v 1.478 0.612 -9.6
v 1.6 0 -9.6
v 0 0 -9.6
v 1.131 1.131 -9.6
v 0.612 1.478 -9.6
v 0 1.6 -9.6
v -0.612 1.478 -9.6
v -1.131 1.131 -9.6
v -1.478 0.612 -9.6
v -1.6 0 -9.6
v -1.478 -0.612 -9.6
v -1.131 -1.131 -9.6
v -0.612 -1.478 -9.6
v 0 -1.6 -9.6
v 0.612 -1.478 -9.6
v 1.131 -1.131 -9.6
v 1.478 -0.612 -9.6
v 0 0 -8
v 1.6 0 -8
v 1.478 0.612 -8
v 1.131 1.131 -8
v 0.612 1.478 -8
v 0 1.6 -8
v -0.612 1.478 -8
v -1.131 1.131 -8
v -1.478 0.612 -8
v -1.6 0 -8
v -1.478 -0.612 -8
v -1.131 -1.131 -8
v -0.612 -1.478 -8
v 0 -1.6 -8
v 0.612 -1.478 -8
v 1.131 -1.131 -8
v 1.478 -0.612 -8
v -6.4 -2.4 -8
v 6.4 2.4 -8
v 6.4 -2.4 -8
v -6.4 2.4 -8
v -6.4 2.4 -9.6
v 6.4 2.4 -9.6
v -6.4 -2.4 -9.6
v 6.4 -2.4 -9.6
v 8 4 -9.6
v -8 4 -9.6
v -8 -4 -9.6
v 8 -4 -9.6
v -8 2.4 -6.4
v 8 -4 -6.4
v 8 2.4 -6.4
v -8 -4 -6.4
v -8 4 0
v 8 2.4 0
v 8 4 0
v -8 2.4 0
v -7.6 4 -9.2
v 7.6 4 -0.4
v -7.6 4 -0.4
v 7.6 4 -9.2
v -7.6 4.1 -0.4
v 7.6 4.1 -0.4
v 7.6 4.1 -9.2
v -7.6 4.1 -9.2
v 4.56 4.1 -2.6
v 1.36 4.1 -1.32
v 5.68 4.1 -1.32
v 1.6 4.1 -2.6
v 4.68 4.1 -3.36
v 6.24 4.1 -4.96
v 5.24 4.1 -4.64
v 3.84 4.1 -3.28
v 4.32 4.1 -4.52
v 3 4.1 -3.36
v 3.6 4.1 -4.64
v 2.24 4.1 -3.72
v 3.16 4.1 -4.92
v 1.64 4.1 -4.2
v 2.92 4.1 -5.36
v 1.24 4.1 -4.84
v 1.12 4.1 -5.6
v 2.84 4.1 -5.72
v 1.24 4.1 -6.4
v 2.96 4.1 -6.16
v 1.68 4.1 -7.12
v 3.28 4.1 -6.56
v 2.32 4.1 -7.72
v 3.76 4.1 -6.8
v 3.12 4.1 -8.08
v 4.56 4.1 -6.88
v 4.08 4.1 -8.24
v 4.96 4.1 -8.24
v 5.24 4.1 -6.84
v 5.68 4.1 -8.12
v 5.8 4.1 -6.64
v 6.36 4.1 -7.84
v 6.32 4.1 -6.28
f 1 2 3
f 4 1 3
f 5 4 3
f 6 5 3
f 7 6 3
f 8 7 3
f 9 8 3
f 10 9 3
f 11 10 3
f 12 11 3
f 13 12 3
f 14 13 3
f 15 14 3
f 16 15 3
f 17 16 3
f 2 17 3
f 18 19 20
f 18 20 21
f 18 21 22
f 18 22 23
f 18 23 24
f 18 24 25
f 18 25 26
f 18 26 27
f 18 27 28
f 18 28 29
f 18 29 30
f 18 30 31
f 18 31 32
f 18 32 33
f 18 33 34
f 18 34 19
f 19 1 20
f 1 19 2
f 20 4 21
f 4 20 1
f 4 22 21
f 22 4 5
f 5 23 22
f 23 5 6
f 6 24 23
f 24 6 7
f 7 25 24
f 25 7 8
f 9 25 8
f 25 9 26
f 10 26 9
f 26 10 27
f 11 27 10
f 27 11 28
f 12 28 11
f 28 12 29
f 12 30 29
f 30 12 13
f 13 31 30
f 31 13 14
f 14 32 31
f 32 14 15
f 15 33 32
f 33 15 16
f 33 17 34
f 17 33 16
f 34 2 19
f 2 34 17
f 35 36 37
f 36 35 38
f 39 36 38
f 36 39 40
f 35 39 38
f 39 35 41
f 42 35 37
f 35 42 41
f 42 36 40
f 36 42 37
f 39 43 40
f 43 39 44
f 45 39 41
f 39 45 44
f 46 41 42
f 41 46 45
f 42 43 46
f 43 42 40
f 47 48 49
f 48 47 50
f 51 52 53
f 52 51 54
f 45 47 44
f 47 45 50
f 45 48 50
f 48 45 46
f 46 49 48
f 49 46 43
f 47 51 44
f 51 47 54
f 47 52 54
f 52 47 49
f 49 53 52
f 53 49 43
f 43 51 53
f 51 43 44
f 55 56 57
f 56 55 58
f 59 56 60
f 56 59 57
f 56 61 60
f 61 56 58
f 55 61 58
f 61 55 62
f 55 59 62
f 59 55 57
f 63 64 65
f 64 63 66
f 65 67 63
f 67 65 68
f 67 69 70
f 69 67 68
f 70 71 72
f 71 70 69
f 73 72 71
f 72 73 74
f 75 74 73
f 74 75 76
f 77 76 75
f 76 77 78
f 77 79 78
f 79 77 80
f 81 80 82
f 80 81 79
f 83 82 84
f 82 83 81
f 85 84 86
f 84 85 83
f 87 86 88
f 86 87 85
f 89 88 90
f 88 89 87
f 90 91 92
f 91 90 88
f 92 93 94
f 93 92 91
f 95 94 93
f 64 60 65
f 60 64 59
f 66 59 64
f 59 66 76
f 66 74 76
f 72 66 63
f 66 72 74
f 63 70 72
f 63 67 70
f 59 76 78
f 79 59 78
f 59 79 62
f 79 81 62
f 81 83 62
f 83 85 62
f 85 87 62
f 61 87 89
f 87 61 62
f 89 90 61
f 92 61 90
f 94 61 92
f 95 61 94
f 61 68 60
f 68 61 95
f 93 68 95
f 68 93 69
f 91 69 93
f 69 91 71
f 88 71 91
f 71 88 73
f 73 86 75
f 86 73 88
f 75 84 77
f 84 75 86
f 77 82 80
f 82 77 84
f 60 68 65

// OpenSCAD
// file: ../p/4-4edge.scad
use <../lib.scad>
function ldraw_lib__4_4edge() = [
// 0 Circle 1.0
// 0 Name: 4-4edge.dat
// 0 Author: James Jessiman
// 0 !LDRAW_ORG Primitive UPDATE 2017-01
// 0 !LICENSE Licensed under CC BY 2.0 and CC BY 4.0 : see CAreadme.txt
// 
// 0 BFC CERTIFY CCW
  [0,"BFC","CERTIFY"],
  [0,"BFC","CCW"],
// 
// 0 !HISTORY 1998-12-15 [PTadmin] Official Update 1998-10
// 0 !HISTORY 2005-12-28 [PTadmin] Official Update 2005-01
// 0 !HISTORY 2007-06-24 [PTadmin] Header formatted for Contributor Agreement
// 0 !HISTORY 2008-07-01 [PTadmin] Official Update 2008-01
// 0 !HISTORY 2017-01-15 [Steffen] BFCed
// 0 !HISTORY 2017-12-30 [PTadmin] Official Update 2017-01
// 
// 
// 2 24 1 0 0 0.9239 0 0.3827
  [2,24,1,0,0,0.9239,0,0.3827],
// 2 24 0.9239 0 0.3827 0.7071 0 0.7071
  [2,24,0.9239,0,0.3827,0.7071,0,0.7071],
// 2 24 0.7071 0 0.7071 0.3827 0 0.9239
  [2,24,0.7071,0,0.7071,0.3827,0,0.9239],
// 2 24 0.3827 0 0.9239 0 0 1
  [2,24,0.3827,0,0.9239,0,0,1],
// 2 24 0 0 1 -0.3827 0 0.9239
  [2,24,0,0,1,-0.3827,0,0.9239],
// 2 24 -0.3827 0 0.9239 -0.7071 0 0.7071
  [2,24,-0.3827,0,0.9239,-0.7071,0,0.7071],
// 2 24 -0.7071 0 0.7071 -0.9239 0 0.3827
  [2,24,-0.7071,0,0.7071,-0.9239,0,0.3827],
// 2 24 -0.9239 0 0.3827 -1 0 -0
  [2,24,-0.9239,0,0.3827,-1,0,-0],
// 2 24 -1 0 -0 -0.9239 0 -0.3827
  [2,24,-1,0,-0,-0.9239,0,-0.3827],
// 2 24 -0.9239 0 -0.3827 -0.7071 0 -0.7071
  [2,24,-0.9239,0,-0.3827,-0.7071,0,-0.7071],
// 2 24 -0.7071 0 -0.7071 -0.3827 0 -0.9239
  [2,24,-0.7071,0,-0.7071,-0.3827,0,-0.9239],
// 2 24 -0.3827 0 -0.9239 0 0 -1
  [2,24,-0.3827,0,-0.9239,0,0,-1],
// 2 24 0 0 -1 0.3827 0 -0.9239
  [2,24,0,0,-1,0.3827,0,-0.9239],
// 2 24 0.3827 0 -0.9239 0.7071 0 -0.7071
  [2,24,0.3827,0,-0.9239,0.7071,0,-0.7071],
// 2 24 0.7071 0 -0.7071 0.9239 0 -0.3827
  [2,24,0.7071,0,-0.7071,0.9239,0,-0.3827],
// 2 24 0.9239 0 -0.3827 1 0 0
  [2,24,0.9239,0,-0.3827,1,0,0],
];
module ldraw_lib__4_4edge(step=0, col=false, unit=2/5, alt=false, line=0.2, solid=!$preview)
    makepoly(ldraw_lib__4_4edge(), step=step, col=col, unit=unit, alt=alt, line=line, solid=solid);
ldraw_lib__4_4edge(line=0.2);
// file: ../p/4-4disc.scad
use <../lib.scad>
function ldraw_lib__4_4disc() = [
// 0 Disc 1.0
// 0 Name: 4-4disc.dat
// 0 Author: James Jessiman
// 0 !LDRAW_ORG Primitive UPDATE 2002-02
// 0 !LICENSE Licensed under CC BY 2.0 and CC BY 4.0 : see CAreadme.txt
// 
// 0 BFC CERTIFY CCW
  [0,"BFC","CERTIFY"],
  [0,"BFC","CCW"],
// 
// 0 !HISTORY 1998-12-15 [PTadmin] Official Update 1998-10
// 0 !HISTORY 2002-03-23 [sbliss] Added BFC statement
// 0 !HISTORY 2002-04-25 [PTadmin] Official Update 2002-02
// 0 !HISTORY 2007-06-24 [PTadmin] Header formatted for Contributor Agreement
// 0 !HISTORY 2008-07-01 [PTadmin] Official Update 2008-01
// 
// 
// 3 16 0 0 0 1 0 0 0.9239 0 0.3827
  [3,16,0,0,0,1,0,0,0.9239,0,0.3827],
// 3 16 0 0 0 0.9239 0 0.3827 0.7071 0 0.7071
  [3,16,0,0,0,0.9239,0,0.3827,0.7071,0,0.7071],
// 3 16 0 0 0 0.7071 0 0.7071 0.3827 0 0.9239
  [3,16,0,0,0,0.7071,0,0.7071,0.3827,0,0.9239],
// 3 16 0 0 0 0.3827 0 0.9239 0 0 1
  [3,16,0,0,0,0.3827,0,0.9239,0,0,1],
// 3 16 0 0 0 0 0 1 -0.3827 0 0.9239
  [3,16,0,0,0,0,0,1,-0.3827,0,0.9239],
// 3 16 0 0 0 -0.3827 0 0.9239 -0.7071 0 0.7071
  [3,16,0,0,0,-0.3827,0,0.9239,-0.7071,0,0.7071],
// 3 16 0 0 0 -0.7071 0 0.7071 -0.9239 0 0.3827
  [3,16,0,0,0,-0.7071,0,0.7071,-0.9239,0,0.3827],
// 3 16 0 0 0 -0.9239 0 0.3827 -1 0 -0
  [3,16,0,0,0,-0.9239,0,0.3827,-1,0,-0],
// 3 16 0 0 0 -1 0 -0 -0.9239 0 -0.3827
  [3,16,0,0,0,-1,0,-0,-0.9239,0,-0.3827],
// 3 16 0 0 0 -0.9239 0 -0.3827 -0.7071 0 -0.7071
  [3,16,0,0,0,-0.9239,0,-0.3827,-0.7071,0,-0.7071],
// 3 16 0 0 0 -0.7071 0 -0.7071 -0.3827 0 -0.9239
  [3,16,0,0,0,-0.7071,0,-0.7071,-0.3827,0,-0.9239],
// 3 16 0 0 0 -0.3827 0 -0.9239 0 0 -1
  [3,16,0,0,0,-0.3827,0,-0.9239,0,0,-1],
// 3 16 0 0 0 0 0 -1 0.3827 0 -0.9239
  [3,16,0,0,0,0,0,-1,0.3827,0,-0.9239],
// 3 16 0 0 0 0.3827 0 -0.9239 0.7071 0 -0.7071
  [3,16,0,0,0,0.3827,0,-0.9239,0.7071,0,-0.7071],
// 3 16 0 0 0 0.7071 0 -0.7071 0.9239 0 -0.3827
  [3,16,0,0,0,0.7071,0,-0.7071,0.9239,0,-0.3827],
// 3 16 0 0 0 0.9239 0 -0.3827 1 0 0
  [3,16,0,0,0,0.9239,0,-0.3827,1,0,0],
// 0
];
module ldraw_lib__4_4disc(step=0, col=false, unit=2/5, alt=false, line=0.2, solid=!$preview)
    makepoly(ldraw_lib__4_4disc(), step=step, col=col, unit=unit, alt=alt, line=line, solid=solid);
ldraw_lib__4_4disc(line=0.2);
// file: ../p/4-4cyli.scad
use <../lib.scad>
$fa=1; $fs=0.2;
function ldraw_lib__4_4cyli(realsolid=false) = [
// 0 Cylinder 1.0
// 0 Name: 4-4cyli.dat
// 0 Author: James Jessiman
// 0 !LDRAW_ORG Primitive UPDATE 2005-01
// 0 !LICENSE Licensed under CC BY 2.0 and CC BY 4.0 : see CAreadme.txt
// 
// 0 BFC CERTIFY CCW
  [0,"BFC","CERTIFY"],
  [0,"BFC","CCW"],
// 
// 0 !HISTORY 1998-12-15 [PTadmin] Official Update 1998-10
// 0 !HISTORY 2002-03-23 [sbliss] Added BFC statement; merged headers from files in distributions LDraw 0.27 and Complete.
// 0 !HISTORY 2002-04-25 [PTadmin] Official Update 2002-02
// 0 !HISTORY 2004-12-14 [guyvivan] BFC CCW
// 0 !HISTORY 2005-12-28 [PTadmin] Official Update 2005-01
// 0 !HISTORY 2007-06-24 [PTadmin] Header formatted for Contributor Agreement
// 0 !HISTORY 2008-07-01 [PTadmin] Official Update 2008-01
// 
// 
// 4 16 1 1 0 0.9239 1 0.3827 0.9239 0 0.3827 1 0 0
  [4,16,1,1,0,0.9239,1,0.3827,0.9239,0,0.3827,1,0,0],
// 5 24 1 0 0 1 1 0 0.9239 0 0.3827 0.9239 0 -0.3827
  [5,24,1,0,0,1,1,0,0.9239,0,0.3827,0.9239,0,-0.3827],
// 4 16 0.9239 1 0.3827 0.7071 1 0.7071 0.7071 0 0.7071 0.9239 0 0.3827
  [4,16,0.9239,1,0.3827,0.7071,1,0.7071,0.7071,0,0.7071,0.9239,0,0.3827],
// 5 24 0.9239 0 0.3827 0.9239 1 0.3827 0.7071 0 0.7071 1 0 0
  [5,24,0.9239,0,0.3827,0.9239,1,0.3827,0.7071,0,0.7071,1,0,0],
// 4 16 0.7071 1 0.7071 0.3827 1 0.9239 0.3827 0 0.9239 0.7071 0 0.7071
  [4,16,0.7071,1,0.7071,0.3827,1,0.9239,0.3827,0,0.9239,0.7071,0,0.7071],
// 5 24 0.7071 0 0.7071 0.7071 1 0.7071 0.3827 0 0.9239 0.9239 0 0.3827
  [5,24,0.7071,0,0.7071,0.7071,1,0.7071,0.3827,0,0.9239,0.9239,0,0.3827],
// 4 16 0.3827 1 0.9239 0 1 1 0 0 1 0.3827 0 0.9239
  [4,16,0.3827,1,0.9239,0,1,1,0,0,1,0.3827,0,0.9239],
// 5 24 0.3827 0 0.9239 0.3827 1 0.9239 0 0 1 0.7071 0 0.7071
  [5,24,0.3827,0,0.9239,0.3827,1,0.9239,0,0,1,0.7071,0,0.7071],
// 4 16 0 1 1 -0.3827 1 0.9239 -0.3827 0 0.9239 0 0 1
  [4,16,0,1,1,-0.3827,1,0.9239,-0.3827,0,0.9239,0,0,1],
// 5 24 0 0 1 0 1 1 -0.3827 0 0.9239 0.3827 0 0.9239
  [5,24,0,0,1,0,1,1,-0.3827,0,0.9239,0.3827,0,0.9239],
// 4 16 -0.3827 1 0.9239 -0.7071 1 0.7071 -0.7071 0 0.7071 -0.3827 0 0.9239
  [4,16,-0.3827,1,0.9239,-0.7071,1,0.7071,-0.7071,0,0.7071,-0.3827,0,0.9239],
// 5 24 -0.3827 0 0.9239 -0.3827 1 0.9239 -0.7071 0 0.7071 0 0 1
  [5,24,-0.3827,0,0.9239,-0.3827,1,0.9239,-0.7071,0,0.7071,0,0,1],
// 4 16 -0.7071 1 0.7071 -0.9239 1 0.3827 -0.9239 0 0.3827 -0.7071 0 0.7071
  [4,16,-0.7071,1,0.7071,-0.9239,1,0.3827,-0.9239,0,0.3827,-0.7071,0,0.7071],
// 5 24 -0.7071 0 0.7071 -0.7071 1 0.7071 -0.9239 0 0.3827 -0.3827 0 0.9239
  [5,24,-0.7071,0,0.7071,-0.7071,1,0.7071,-0.9239,0,0.3827,-0.3827,0,0.9239],
// 4 16 -0.9239 1 0.3827 -1 1 0 -1 0 0 -0.9239 0 0.3827
  [4,16,-0.9239,1,0.3827,-1,1,0,-1,0,0,-0.9239,0,0.3827],
// 5 24 -0.9239 0 0.3827 -0.9239 1 0.3827 -1 0 0 -0.7071 0 0.7071
  [5,24,-0.9239,0,0.3827,-0.9239,1,0.3827,-1,0,0,-0.7071,0,0.7071],
// 4 16 -1 1 0 -0.9239 1 -0.3827 -0.9239 0 -0.3827 -1 0 0
  [4,16,-1,1,0,-0.9239,1,-0.3827,-0.9239,0,-0.3827,-1,0,0],
// 5 24 -1 0 0 -1 1 0 -0.9239 0 -0.3827 -0.9239 0 0.3827
  [5,24,-1,0,0,-1,1,0,-0.9239,0,-0.3827,-0.9239,0,0.3827],
// 4 16 -0.9239 1 -0.3827 -0.7071 1 -0.7071 -0.7071 0 -0.7071 -0.9239 0 -0.3827
  [4,16,-0.9239,1,-0.3827,-0.7071,1,-0.7071,-0.7071,0,-0.7071,-0.9239,0,-0.3827],
// 5 24 -0.9239 0 -0.3827 -0.9239 1 -0.3827 -0.7071 0 -0.7071 -1 0 0
  [5,24,-0.9239,0,-0.3827,-0.9239,1,-0.3827,-0.7071,0,-0.7071,-1,0,0],
// 4 16 -0.7071 1 -0.7071 -0.3827 1 -0.9239 -0.3827 0 -0.9239 -0.7071 0 -0.7071
  [4,16,-0.7071,1,-0.7071,-0.3827,1,-0.9239,-0.3827,0,-0.9239,-0.7071,0,-0.7071],
// 5 24 -0.7071 0 -0.7071 -0.7071 1 -0.7071 -0.3827 0 -0.9239 -0.9239 0 -0.3827
  [5,24,-0.7071,0,-0.7071,-0.7071,1,-0.7071,-0.3827,0,-0.9239,-0.9239,0,-0.3827],
// 4 16 -0.3827 1 -0.9239 0 1 -1 0 0 -1 -0.3827 0 -0.9239
  [4,16,-0.3827,1,-0.9239,0,1,-1,0,0,-1,-0.3827,0,-0.9239],
// 5 24 -0.3827 0 -0.9239 -0.3827 1 -0.9239 0 0 -1 -0.7071 0 -0.7071
  [5,24,-0.3827,0,-0.9239,-0.3827,1,-0.9239,0,0,-1,-0.7071,0,-0.7071],
// 4 16 0 1 -1 0.3827 1 -0.9239 0.3827 0 -0.9239 0 0 -1
  [4,16,0,1,-1,0.3827,1,-0.9239,0.3827,0,-0.9239,0,0,-1],
// 5 24 0 0 -1 0 1 -1 0.3827 0 -0.9239 -0.3827 0 -0.9239
  [5,24,0,0,-1,0,1,-1,0.3827,0,-0.9239,-0.3827,0,-0.9239],
// 4 16 0.3827 1 -0.9239 0.7071 1 -0.7071 0.7071 0 -0.7071 0.3827 0 -0.9239
  [4,16,0.3827,1,-0.9239,0.7071,1,-0.7071,0.7071,0,-0.7071,0.3827,0,-0.9239],
// 5 24 0.3827 0 -0.9239 0.3827 1 -0.9239 0.7071 0 -0.7071 0 0 -1
  [5,24,0.3827,0,-0.9239,0.3827,1,-0.9239,0.7071,0,-0.7071,0,0,-1],
// 4 16 0.7071 1 -0.7071 0.9239 1 -0.3827 0.9239 0 -0.3827 0.7071 0 -0.7071
  [4,16,0.7071,1,-0.7071,0.9239,1,-0.3827,0.9239,0,-0.3827,0.7071,0,-0.7071],
// 5 24 0.7071 0 -0.7071 0.7071 1 -0.7071 0.9239 0 -0.3827 0.3827 0 -0.9239
  [5,24,0.7071,0,-0.7071,0.7071,1,-0.7071,0.9239,0,-0.3827,0.3827,0,-0.9239],
// 4 16 0.9239 1 -0.3827 1 1 0 1 0 0 0.9239 0 -0.3827
  [4,16,0.9239,1,-0.3827,1,1,0,1,0,0,0.9239,0,-0.3827],
// 5 24 0.9239 0 -0.3827 0.9239 1 -0.3827 1 0 0 0.7071 0 -0.7071
  [5,24,0.9239,0,-0.3827,0.9239,1,-0.3827,1,0,0,0.7071,0,-0.7071],
// 0
];
module ldraw_lib__4_4cyli(step=0, col=false, unit=2/5, alt=false, line=0.2, solid=!$preview)
    makepoly(ldraw_lib__4_4cyli(solid), step=step, col=col, unit=unit, alt=alt, line=line, solid=solid);
ldraw_lib__4_4cyli(line=0.2);
// file: ../p/stud3.scad
use <../lib.scad>
use <4-4cyli.scad>
use <4-4disc.scad>
use <4-4edge.scad>
function ldraw_lib__stud3() = [
// 0 Stud Tube Solid
// 0 Name: stud3.dat
// 0 Author: James Jessiman
// 0 !LDRAW_ORG Primitive UPDATE 2012-01
// 0 !LICENSE Licensed under CC BY 4.0 : see CAreadme.txt
// 
// 0 BFC CERTIFY CCW
  [0,"BFC","CERTIFY"],
  [0,"BFC","CCW"],
// 
// 0 !HISTORY 2002-04-04 [sbliss] Modified for BFC compliance
// 0 !HISTORY 2002-04-25 [PTadmin] Official Update 2002-02
// 0 !HISTORY 2007-06-24 [PTadmin] Header formatted for Contributor Agreement
// 0 !HISTORY 2008-07-01 [PTadmin] Official Update 2008-01
// 0 !HISTORY 2012-02-16 [Philo] Changed to CCW
// 0 !HISTORY 2012-03-30 [PTadmin] Official Update 2012-01
// 
// 
// 1 16 0 -4 0 4 0 0 0 1 0 0 0 4 4-4edge.dat
  [1,16,0,-4,0,4,0,0,0,1,0,0,0,4, ldraw_lib__4_4edge()],
// 1 16 0 0 0 4 0 0 0 1 0 0 0 4 4-4edge.dat
  [1,16,0,0,0,4,0,0,0,1,0,0,0,4, ldraw_lib__4_4edge()],
// 1 16 0 -4 0 4 0 0 0 1 0 0 0 4 4-4disc.dat
  [1,16,0,-4,0,4,0,0,0,1,0,0,0,4, ldraw_lib__4_4disc()],
  [-1,16,0,0,0,4,0,0,0,-1,0,0,0,4, ldraw_lib__4_4disc()],
// 1 16 0 -4 0 4 0 0 0 4 0 0 0 4 4-4cyli.dat
  [1,16,0,-4,0,4,0,0,0,4,0,0,0,4, ldraw_lib__4_4cyli()],
];
module ldraw_lib__stud3(step=0, col=false, unit=2/5, alt=false, line=0.2, solid=!$preview)
    makepoly(ldraw_lib__stud3(), step=step, col=col, unit=unit, alt=alt, line=line, solid=solid);
ldraw_lib__stud3(line=0.2);
// file: ../p/box5.scad
use <../lib.scad>
function ldraw_lib__box5() = [
// 0 Box with 5 Faces and All Edges
// 0 Name: box5.dat
// 0 Author: James Jessiman
// 0 !LDRAW_ORG Primitive UPDATE 2012-01
// 0 !LICENSE Licensed under CC BY 2.0 and CC BY 4.0 : see CAreadme.txt
// 
// 0 BFC CERTIFY CCW
  [0,"BFC","CERTIFY"],
  [0,"BFC","CCW"],
// 
// 0 !HISTORY 2002-04-03 [sbliss] Modified for BFC compliance
// 0 !HISTORY 2002-04-25 [PTadmin] Official Update 2002-02
// 0 !HISTORY 2007-06-24 [PTadmin] Header formatted for Contributor Agreement
// 0 !HISTORY 2008-07-01 [PTadmin] Official Update 2008-01
// 0 !HISTORY 2012-02-16 [Philo] Changed to CCW
// 0 !HISTORY 2012-03-30 [PTadmin] Official Update 2012-01
// 
// 
// 2 24 1 1 1 -1 1 1
  [2,24,1,1,1,-1,1,1],
// 2 24 -1 1 1 -1 1 -1
  [2,24,-1,1,1,-1,1,-1],
// 2 24 -1 1 -1 1 1 -1
  [2,24,-1,1,-1,1,1,-1],
// 2 24 1 1 -1 1 1 1
  [2,24,1,1,-1,1,1,1],
// 2 24 1 0 1 -1 0 1
  [2,24,1,0,1,-1,0,1],
// 2 24 -1 0 1 -1 0 -1
  [2,24,-1,0,1,-1,0,-1],
// 2 24 -1 0 -1 1 0 -1
  [2,24,-1,0,-1,1,0,-1],
// 2 24 1 0 -1 1 0 1
  [2,24,1,0,-1,1,0,1],
// 2 24 1 0 1 1 1 1
  [2,24,1,0,1,1,1,1],
// 2 24 -1 0 1 -1 1 1
  [2,24,-1,0,1,-1,1,1],
// 2 24 1 0 -1 1 1 -1
  [2,24,1,0,-1,1,1,-1],
// 2 24 -1 0 -1 -1 1 -1
  [2,24,-1,0,-1,-1,1,-1],
// 4 16 -1 1 1 1 1 1 1 1 -1 -1 1 -1
  [4,16,-1,1,1,1,1,1,1,1,-1,-1,1,-1],
// 4 16 -1 1 1 -1 0 1 1 0 1 1 1 1
  [4,16,-1,1,1,-1,0,1,1,0,1,1,1,1],
// 4 16 -1 1 -1 -1 0 -1 -1 0 1 -1 1 1
  [4,16,-1,1,-1,-1,0,-1,-1,0,1,-1,1,1],
// 4 16 1 1 -1 1 0 -1 -1 0 -1 -1 1 -1
  [4,16,1,1,-1,1,0,-1,-1,0,-1,-1,1,-1],
// 4 16 1 1 1 1 0 1 1 0 -1 1 1 -1
  [4,16,1,1,1,1,0,1,1,0,-1,1,1,-1],
];
makepoly(ldraw_lib__box5(), line=0.2);
// file: s/4865as01.scad
use <../../lib.scad>
use <../../p/box5.scad>
use <../../p/stud3.scad>
function ldraw_lib__s__4865as01() = [
// 0 ~Panel  1 x  2 x  1 without Front Face
// 0 Name: s\4865as01.dat
// 0 Author: James Jessiman
// 0 !LDRAW_ORG Subpart UPDATE 2020-03
// 0 !LICENSE Licensed under CC BY 2.0 and CC BY 4.0 : see CAreadme.txt
// 
// 0 BFC CERTIFY CCW
  [0,"BFC","CERTIFY"],
  [0,"BFC","CCW"],
// 
// 0 !HISTORY 2003-07-03 [Steffen] BFCed, subfiled
// 0 !HISTORY 2004-04-22 [PTadmin] Official Update 2004-02
// 0 !HISTORY 2007-09-10 [PTadmin] Header formatted for Contributor Agreement
// 0 !HISTORY 2008-07-01 [PTadmin] Official Update 2008-01
// 0 !HISTORY 2020-07-14 [PTadmin] Renamed from s/4865s01
// 0 !HISTORY 2020-12-29 [PTadmin] Official Update 2020-03
// 
// 
// 1 16 0 20 0 1 0 0 0 -1 0 0 0 1 stud3.dat
  [1,16,0,20,0,1,0,0,0,-1,0,0,0,1, ldraw_lib__stud3()],
// 0 BFC INVERTNEXT
  [0,"BFC","INVERTNEXT"],
// 1 16 0 24 0 16 0 0 0 -4 0 0 0 6 box5.dat
  [1,16,0,24,0,16,0,0,0,-4,0,0,0,6, ldraw_lib__box5()],
// 4 16 20 24 10 16 24 6 -16 24 6 -20 24 10
  [4,16,20,24,10,16,24,6,-16,24,6,-20,24,10],
// 4 16 -20 24 10 -16 24 6 -16 24 -6 -20 24 -10
  [4,16,-20,24,10,-16,24,6,-16,24,-6,-20,24,-10],
// 4 16 -20 24 -10 -16 24 -6 16 24 -6 20 24 -10
  [4,16,-20,24,-10,-16,24,-6,16,24,-6,20,24,-10],
// 4 16 20 24 -10 16 24 -6 16 24 6 20 24 10
  [4,16,20,24,-10,16,24,-6,16,24,6,20,24,10],
// 2 24 20 24 10 -20 24 10
  [2,24,20,24,10,-20,24,10],
// 2 24 -20 24 10 -20 24 -10
  [2,24,-20,24,10,-20,24,-10],
// 2 24 -20 24 -10 20 24 -10
  [2,24,-20,24,-10,20,24,-10],
// 2 24 20 24 -10 20 24 10
  [2,24,20,24,-10,20,24,10],
// 2 24 20 16 6 -20 16 6
  [2,24,20,16,6,-20,16,6],
// 2 24 -20 16 6 -20 16 -10
  [2,24,-20,16,6,-20,16,-10],
// 2 24 -20 16 -10 20 16 -10
  [2,24,-20,16,-10,20,16,-10],
// 2 24 20 16 -10 20 16 6
  [2,24,20,16,-10,20,16,6],
// 2 24 20 0 10 -20 0 10
  [2,24,20,0,10,-20,0,10],
// 2 24 -20 0 10 -20 0 6
  [2,24,-20,0,10,-20,0,6],
// 2 24 -20 0 6 20 0 6
  [2,24,-20,0,6,20,0,6],
// 2 24 20 0 6 20 0 10
  [2,24,20,0,6,20,0,10],
// 2 24 20 0 6 20 16 6
  [2,24,20,0,6,20,16,6],
// 2 24 -20 0 6 -20 16 6
  [2,24,-20,0,6,-20,16,6],
// 2 24 20 16 -10 20 24 -10
  [2,24,20,16,-10,20,24,-10],
// 2 24 -20 16 -10 -20 24 -10
  [2,24,-20,16,-10,-20,24,-10],
// 2 24 20 0 10 20 24 10
  [2,24,20,0,10,20,24,10],
// 2 24 -20 0 10 -20 24 10
  [2,24,-20,0,10,-20,24,10],
// 4 16 20 16 -10 20 16 6 -20 16 6 -20 16 -10
  [4,16,20,16,-10,20,16,6,-20,16,6,-20,16,-10],
// 4 16 20 0 6 20 0 10 -20 0 10 -20 0 6
  [4,16,20,0,6,20,0,10,-20,0,10,-20,0,6],
// 4 16 -20 24 10 -20 24 -10 -20 16 -10 -20 16 6
  [4,16,-20,24,10,-20,24,-10,-20,16,-10,-20,16,6],
// 4 16 -20 24 -10 20 24 -10 20 16 -10 -20 16 -10
  [4,16,-20,24,-10,20,24,-10,20,16,-10,-20,16,-10],
// 4 16 20 24 -10 20 24 10 20 16 6 20 16 -10
  [4,16,20,24,-10,20,24,10,20,16,6,20,16,-10],
// 4 16 -20 24 10 -20 16 6 -20 0 6 -20 0 10
  [4,16,-20,24,10,-20,16,6,-20,0,6,-20,0,10],
// 4 16 -20 16 6 20 16 6 20 0 6 -20 0 6
  [4,16,-20,16,6,20,16,6,20,0,6,-20,0,6],
// 4 16 20 16 6 20 24 10 20 0 10 20 0 6
  [4,16,20,16,6,20,24,10,20,0,10,20,0,6],
// 0
];
makepoly(ldraw_lib__s__4865as01(), line=0.2);
// file: ../p/box5-12.scad
use <../lib.scad>
function ldraw_lib__box5_12() = [
// 0 Box with 5 Faces without Any Edges
// 0 Name: box5-12.dat
// 0 Author: Chris Dee [cwdee]
// 0 !LDRAW_ORG Primitive UPDATE 2009-02
// 0 !LICENSE Licensed under CC BY 2.0 and CC BY 4.0 : see CAreadme.txt
// 
// 0 BFC CERTIFY CCW
  [0,"BFC","CERTIFY"],
  [0,"BFC","CCW"],
// 
// 0 !HISTORY 2009-09-03 [PTadmin] Official Update 2009-02
// 
// 
// 4 16 1 1 1 1 1 -1 -1 1 -1 -1 1 1
  [4,16,1,1,1,1,1,-1,-1,1,-1,-1,1,1],
// 4 16 -1 0 1 1 0 1 1 1 1 -1 1 1
  [4,16,-1,0,1,1,0,1,1,1,1,-1,1,1],
// 4 16 -1 0 -1 -1 0 1 -1 1 1 -1 1 -1
  [4,16,-1,0,-1,-1,0,1,-1,1,1,-1,1,-1],
// 4 16 1 0 -1 -1 0 -1 -1 1 -1 1 1 -1
  [4,16,1,0,-1,-1,0,-1,-1,1,-1,1,1,-1],
// 4 16 1 0 1 1 0 -1 1 1 -1 1 1 1
  [4,16,1,0,1,1,0,-1,1,1,-1,1,1,1],
// 0
];
module ldraw_lib__box5_12(step=0, col=false, unit=2/5, alt=false, line=0.2, solid=!$preview)
    makepoly(ldraw_lib__box5_12(), step=step, col=col, unit=unit, alt=alt, line=line, solid=solid);
ldraw_lib__box5_12(line=0.2);
// file: 4865a.scad
use <../lib.scad>
use <s/4865as01.scad>
function ldraw_lib__4865a() = [
// 0 Panel  1 x  2 x  1 with Square Corners
// 0 Name: 4865a.dat
// 0 Author: James Jessiman
// 0 !LDRAW_ORG Part UPDATE 2020-03
// 0 !LICENSE Licensed under CC BY 2.0 and CC BY 4.0 : see CAreadme.txt
// 
// 0 BFC CERTIFY CCW
  [0,"BFC","CERTIFY"],
  [0,"BFC","CCW"],
// 
// 0 !HISTORY 2003-07-03 [Steffen] BFCed, subfiled
// 0 !HISTORY 2004-04-22 [PTadmin] Official Update 2004-02
// 0 !HISTORY 2007-07-09 [PTadmin] Header formatted for Contributor Agreement
// 0 !HISTORY 2008-07-01 [PTadmin] Official Update 2008-01
// 0 !HISTORY 2011-12-08 [PTadmin] Renamed from 4865
// 0 !HISTORY 2011-12-29 [PTadmin] Official Update 2011-02
// 0 !HISTORY 2020-08-01 [cwdee] Use renamed subfile
// 0 !HISTORY 2020-12-29 [PTadmin] Official Update 2020-03
// 
// 
// 1 16 0 0 0 1 0 0 0 1 0 0 0 1 s\4865as01.dat
  [1,16,0,0,0,1,0,0,0,1,0,0,0,1, ldraw_lib__s__4865as01()],
// 4 16 20 24 10 -20 24 10 -20 0 10 20 0 10
  [4,16,20,24,10,-20,24,10,-20,0,10,20,0,10],
// 
];
module ldraw_lib__4865a(step=0, col=false, unit=2/5, alt=false, line=0.2, solid=!$preview)
    makepoly(ldraw_lib__4865a(), step=step, col=col, unit=unit, alt=alt, line=line, solid=solid);
ldraw_lib__4865a(line=0.2);
// file: 168055b.scad
use <../lib.scad>
use <../p/box5-12.scad>
function ldraw_lib__168055b() = [
// 0 Sticker  1.1 x  1.9 with Left White Number Five on Blue Background
// 0 Name: 168055b.dat
// 0 Author: Takeshi Takahashi [RainbowDolphin]
// 0 !LDRAW_ORG Part UPDATE 2024-03
// 0 !LICENSE Licensed under CC BY 4.0 : see CAreadme.txt
// 
// 0 BFC CERTIFY CCW
  [0,"BFC","CERTIFY"],
  [0,"BFC","CCW"],
// 
// 0 !KEYWORDS Formula 1, race car, Renault, Set 1750
// 
// 0 !HISTORY 2024-04-28 [OrionP] Official Update 2024-03
// 
// 
// 1 16 0 -0.25 0 19 0 0 0 0.25 0 0 0 11 box5-12.dat
  [1,16,0,-0.25,0,19,0,0,0,0.25,0,0,0,11, ldraw_lib__box5_12()],
// 4 15 -4 -0.25 5.5 -3.4 -0.25 8.7 -14.2 -0.25 8.7 -11.4 -0.25 5.5
  [4,15,-4,-0.25,5.5,-3.4,-0.25,8.7,-14.2,-0.25,8.7,-11.4,-0.25,5.5],
// 4 15 -11.7 -0.25 3.6 -11.4 -0.25 5.5 -14.2 -0.25 8.7 -15.6 -0.25 -0.4
  [4,15,-11.7,-0.25,3.6,-11.4,-0.25,5.5,-14.2,-0.25,8.7,-15.6,-0.25,-0.4],
// 4 15 -11.7 -0.25 3.6 -15.6 -0.25 -0.4 -13.1 -0.25 0.4 -9.6 -0.25 3.8
  [4,15,-11.7,-0.25,3.6,-15.6,-0.25,-0.4,-13.1,-0.25,0.4,-9.6,-0.25,3.8],
// 4 15 -9.6 -0.25 3.8 -13.1 -0.25 0.4 -10.8 -0.25 0.7 -7.5 -0.25 3.6
  [4,15,-9.6,-0.25,3.8,-13.1,-0.25,0.4,-10.8,-0.25,0.7,-7.5,-0.25,3.6],
// 4 15 -7.5 -0.25 3.6 -10.8 -0.25 0.7 -9 -0.25 0.4 -5.6 -0.25 2.7
  [4,15,-7.5,-0.25,3.6,-10.8,-0.25,0.7,-9,-0.25,0.4,-5.6,-0.25,2.7],
// 4 15 -5.6 -0.25 2.7 -9 -0.25 0.4 -7.9 -0.25 -0.3 -4.1 -0.25 1.5
  [4,15,-5.6,-0.25,2.7,-9,-0.25,0.4,-7.9,-0.25,-0.3,-4.1,-0.25,1.5],
// 4 15 -4.1 -0.25 1.5 -7.9 -0.25 -0.3 -7.3 -0.25 -1.4 -3.1 -0.25 -0.1
  [4,15,-4.1,-0.25,1.5,-7.9,-0.25,-0.3,-7.3,-0.25,-1.4,-3.1,-0.25,-0.1],
// 4 15 -3.1 -0.25 -0.1 -7.3 -0.25 -1.4 -7.1 -0.25 -2.3 -2.8 -0.25 -2
  [4,15,-3.1,-0.25,-0.1,-7.3,-0.25,-1.4,-7.1,-0.25,-2.3,-2.8,-0.25,-2],
// 4 15 -2.8 -0.25 -2 -7.1 -0.25 -2.3 -7.4 -0.25 -3.4 -3.1 -0.25 -4
  [4,15,-2.8,-0.25,-2,-7.1,-0.25,-2.3,-7.4,-0.25,-3.4,-3.1,-0.25,-4],
// 4 15 -4.2 -0.25 -5.8 -3.1 -0.25 -4 -7.4 -0.25 -3.4 -8.2 -0.25 -4.4
  [4,15,-4.2,-0.25,-5.8,-3.1,-0.25,-4,-7.4,-0.25,-3.4,-8.2,-0.25,-4.4],
// 4 15 -5.8 -0.25 -7.3 -4.2 -0.25 -5.8 -8.2 -0.25 -4.4 -9.4 -0.25 -5
  [4,15,-5.8,-0.25,-7.3,-4.2,-0.25,-5.8,-8.2,-0.25,-4.4,-9.4,-0.25,-5],
// 4 15 -7.8 -0.25 -8.2 -5.8 -0.25 -7.3 -9.4 -0.25 -5 -11.4 -0.25 -5.2
  [4,15,-7.8,-0.25,-8.2,-5.8,-0.25,-7.3,-9.4,-0.25,-5,-11.4,-0.25,-5.2],
// 4 15 -10.2 -0.25 -8.6 -7.8 -0.25 -8.2 -11.4 -0.25 -5.2 -12.4 -0.25 -8.6
  [4,15,-10.2,-0.25,-8.6,-7.8,-0.25,-8.2,-11.4,-0.25,-5.2,-12.4,-0.25,-8.6],
// 4 15 -12.4 -0.25 -8.6 -11.4 -0.25 -5.2 -13.1 -0.25 -5.1 -14.2 -0.25 -8.3
  [4,15,-12.4,-0.25,-8.6,-11.4,-0.25,-5.2,-13.1,-0.25,-5.1,-14.2,-0.25,-8.3],
// 4 15 -14.2 -0.25 -8.3 -13.1 -0.25 -5.1 -14.5 -0.25 -4.6 -15.9 -0.25 -7.6
  [4,15,-14.2,-0.25,-8.3,-13.1,-0.25,-5.1,-14.5,-0.25,-4.6,-15.9,-0.25,-7.6],
// 3 15 -15.8 -0.25 -3.7 -15.9 -0.25 -7.6 -14.5 -0.25 -4.6
  [3,15,-15.8,-0.25,-3.7,-15.9,-0.25,-7.6,-14.5,-0.25,-4.6],
// 4 1 -3.4 -0.25 8.7 19 -0.25 11 -19 -0.25 11 -14.2 -0.25 8.7
  [4,1,-3.4,-0.25,8.7,19,-0.25,11,-19,-0.25,11,-14.2,-0.25,8.7],
// 4 1 19 -0.25 11 -3.4 -0.25 8.7 -4 -0.25 5.5 -4.1 -0.25 1.5
  [4,1,19,-0.25,11,-3.4,-0.25,8.7,-4,-0.25,5.5,-4.1,-0.25,1.5],
// 3 1 -4 -0.25 5.5 -5.6 -0.25 2.7 -4.1 -0.25 1.5
  [3,1,-4,-0.25,5.5,-5.6,-0.25,2.7,-4.1,-0.25,1.5],
// 4 1 -7.5 -0.25 3.6 -5.6 -0.25 2.7 -4 -0.25 5.5 -11.4 -0.25 5.5
  [4,1,-7.5,-0.25,3.6,-5.6,-0.25,2.7,-4,-0.25,5.5,-11.4,-0.25,5.5],
// 3 1 -11.4 -0.25 5.5 -9.6 -0.25 3.8 -7.5 -0.25 3.6
  [3,1,-11.4,-0.25,5.5,-9.6,-0.25,3.8,-7.5,-0.25,3.6],
// 3 1 -11.4 -0.25 5.5 -11.7 -0.25 3.6 -9.6 -0.25 3.8
  [3,1,-11.4,-0.25,5.5,-11.7,-0.25,3.6,-9.6,-0.25,3.8],
// 3 1 19 -0.25 11 -4.1 -0.25 1.5 -3.1 -0.25 -0.1
  [3,1,19,-0.25,11,-4.1,-0.25,1.5,-3.1,-0.25,-0.1],
// 4 1 19 -0.25 11 -3.1 -0.25 -0.1 -2.8 -0.25 -2 19 -0.25 -11
  [4,1,19,-0.25,11,-3.1,-0.25,-0.1,-2.8,-0.25,-2,19,-0.25,-11],
// 3 1 -2.8 -0.25 -2 -3.1 -0.25 -4 19 -0.25 -11
  [3,1,-2.8,-0.25,-2,-3.1,-0.25,-4,19,-0.25,-11],
// 3 1 -3.1 -0.25 -4 -4.2 -0.25 -5.8 19 -0.25 -11
  [3,1,-3.1,-0.25,-4,-4.2,-0.25,-5.8,19,-0.25,-11],
// 3 1 -4.2 -0.25 -5.8 -5.8 -0.25 -7.3 19 -0.25 -11
  [3,1,-4.2,-0.25,-5.8,-5.8,-0.25,-7.3,19,-0.25,-11],
// 3 1 -5.8 -0.25 -7.3 -7.8 -0.25 -8.2 19 -0.25 -11
  [3,1,-5.8,-0.25,-7.3,-7.8,-0.25,-8.2,19,-0.25,-11],
// 4 1 19 -0.25 -11 -7.8 -0.25 -8.2 -10.2 -0.25 -8.6 -19 -0.25 -11
  [4,1,19,-0.25,-11,-7.8,-0.25,-8.2,-10.2,-0.25,-8.6,-19,-0.25,-11],
// 3 1 -10.2 -0.25 -8.6 -12.4 -0.25 -8.6 -19 -0.25 -11
  [3,1,-10.2,-0.25,-8.6,-12.4,-0.25,-8.6,-19,-0.25,-11],
// 3 1 -14.2 -0.25 -8.3 -19 -0.25 -11 -12.4 -0.25 -8.6
  [3,1,-14.2,-0.25,-8.3,-19,-0.25,-11,-12.4,-0.25,-8.6],
// 3 1 -15.9 -0.25 -7.6 -19 -0.25 -11 -14.2 -0.25 -8.3
  [3,1,-15.9,-0.25,-7.6,-19,-0.25,-11,-14.2,-0.25,-8.3],
// 3 1 -15.8 -0.25 -3.7 -19 -0.25 -11 -15.9 -0.25 -7.6
  [3,1,-15.8,-0.25,-3.7,-19,-0.25,-11,-15.9,-0.25,-7.6],
// 4 1 -19 -0.25 -11 -15.8 -0.25 -3.7 -15.6 -0.25 -0.4 -19 -0.25 11
  [4,1,-19,-0.25,-11,-15.8,-0.25,-3.7,-15.6,-0.25,-0.4,-19,-0.25,11],
// 4 1 -13.1 -0.25 0.4 -15.6 -0.25 -0.4 -15.8 -0.25 -3.7 -14.5 -0.25 -4.6
  [4,1,-13.1,-0.25,0.4,-15.6,-0.25,-0.4,-15.8,-0.25,-3.7,-14.5,-0.25,-4.6],
// 4 1 -10.8 -0.25 0.7 -13.1 -0.25 0.4 -14.5 -0.25 -4.6 -13.1 -0.25 -5.1
  [4,1,-10.8,-0.25,0.7,-13.1,-0.25,0.4,-14.5,-0.25,-4.6,-13.1,-0.25,-5.1],
// 4 1 -9 -0.25 0.4 -10.8 -0.25 0.7 -13.1 -0.25 -5.1 -11.4 -0.25 -5.2
  [4,1,-9,-0.25,0.4,-10.8,-0.25,0.7,-13.1,-0.25,-5.1,-11.4,-0.25,-5.2],
// 4 1 -7.9 -0.25 -0.3 -9 -0.25 0.4 -11.4 -0.25 -5.2 -9.4 -0.25 -5
  [4,1,-7.9,-0.25,-0.3,-9,-0.25,0.4,-11.4,-0.25,-5.2,-9.4,-0.25,-5],
// 4 1 -7.3 -0.25 -1.4 -7.9 -0.25 -0.3 -9.4 -0.25 -5 -8.2 -0.25 -4.4
  [4,1,-7.3,-0.25,-1.4,-7.9,-0.25,-0.3,-9.4,-0.25,-5,-8.2,-0.25,-4.4],
// 4 1 -7.1 -0.25 -2.3 -7.3 -0.25 -1.4 -8.2 -0.25 -4.4 -7.4 -0.25 -3.4
  [4,1,-7.1,-0.25,-2.3,-7.3,-0.25,-1.4,-8.2,-0.25,-4.4,-7.4,-0.25,-3.4],
// 3 1 -19 -0.25 11 -15.6 -0.25 -0.4 -14.2 -0.25 8.7
  [3,1,-19,-0.25,11,-15.6,-0.25,-0.4,-14.2,-0.25,8.7],
];
module ldraw_lib__168055b(step=0, col=false, unit=2/5, alt=false, line=0.2, solid=!$preview)
    makepoly(ldraw_lib__168055b(), step=step, col=col, unit=unit, alt=alt, line=line, solid=solid);
ldraw_lib__168055b(line=0.2);
// main file
use <../lib.scad>
use <168055b.scad>
use <4865a.scad>
function ldraw_lib__4865ad07() = [
// 0 Panel  1 x  2 x  1 with White Number "5" Left Sticker
// 0 Name: 4865ad07.dat
// 0 Author: Takeshi Takahashi [RainbowDolphin]
// 0 !LDRAW_ORG Shortcut UPDATE 2024-08
// 0 !LICENSE Licensed under CC BY 4.0 : see CAreadme.txt
// 
// 0 BFC CERTIFY CCW
  [0,"BFC","CERTIFY"],
  [0,"BFC","CCW"],
// 
// 0 !CATEGORY Sticker Shortcut
// 0 !KEYWORDS Bricklink 4865pb050R, Formula 1, Renault, Set 1750
// 
// 0 !HISTORY 2024-09-30 [OrionP] Official Update 2024-08
// 
// 1 16 0 0 0 1 0 0 0 1 0 0 0 1 4865a.dat
  [1,16,0,0,0,1,0,0,0,1,0,0,0,1, ldraw_lib__4865a()],
// 1 16 0 12 10 -1 0 0 0 0 -1 0 -1 0 168055b.dat
  [1,16,0,12,10,-1,0,0,0,0,-1,0,-1,0, ldraw_lib__168055b()],
];
module ldraw_lib__4865ad07(step=0, col=false, unit=2/5, alt=false, line=0.2, solid=!$preview)
    makepoly(ldraw_lib__4865ad07(), step=step, col=col, unit=unit, alt=alt, line=line, solid=solid);
ldraw_lib__4865ad07(line=0.2);
